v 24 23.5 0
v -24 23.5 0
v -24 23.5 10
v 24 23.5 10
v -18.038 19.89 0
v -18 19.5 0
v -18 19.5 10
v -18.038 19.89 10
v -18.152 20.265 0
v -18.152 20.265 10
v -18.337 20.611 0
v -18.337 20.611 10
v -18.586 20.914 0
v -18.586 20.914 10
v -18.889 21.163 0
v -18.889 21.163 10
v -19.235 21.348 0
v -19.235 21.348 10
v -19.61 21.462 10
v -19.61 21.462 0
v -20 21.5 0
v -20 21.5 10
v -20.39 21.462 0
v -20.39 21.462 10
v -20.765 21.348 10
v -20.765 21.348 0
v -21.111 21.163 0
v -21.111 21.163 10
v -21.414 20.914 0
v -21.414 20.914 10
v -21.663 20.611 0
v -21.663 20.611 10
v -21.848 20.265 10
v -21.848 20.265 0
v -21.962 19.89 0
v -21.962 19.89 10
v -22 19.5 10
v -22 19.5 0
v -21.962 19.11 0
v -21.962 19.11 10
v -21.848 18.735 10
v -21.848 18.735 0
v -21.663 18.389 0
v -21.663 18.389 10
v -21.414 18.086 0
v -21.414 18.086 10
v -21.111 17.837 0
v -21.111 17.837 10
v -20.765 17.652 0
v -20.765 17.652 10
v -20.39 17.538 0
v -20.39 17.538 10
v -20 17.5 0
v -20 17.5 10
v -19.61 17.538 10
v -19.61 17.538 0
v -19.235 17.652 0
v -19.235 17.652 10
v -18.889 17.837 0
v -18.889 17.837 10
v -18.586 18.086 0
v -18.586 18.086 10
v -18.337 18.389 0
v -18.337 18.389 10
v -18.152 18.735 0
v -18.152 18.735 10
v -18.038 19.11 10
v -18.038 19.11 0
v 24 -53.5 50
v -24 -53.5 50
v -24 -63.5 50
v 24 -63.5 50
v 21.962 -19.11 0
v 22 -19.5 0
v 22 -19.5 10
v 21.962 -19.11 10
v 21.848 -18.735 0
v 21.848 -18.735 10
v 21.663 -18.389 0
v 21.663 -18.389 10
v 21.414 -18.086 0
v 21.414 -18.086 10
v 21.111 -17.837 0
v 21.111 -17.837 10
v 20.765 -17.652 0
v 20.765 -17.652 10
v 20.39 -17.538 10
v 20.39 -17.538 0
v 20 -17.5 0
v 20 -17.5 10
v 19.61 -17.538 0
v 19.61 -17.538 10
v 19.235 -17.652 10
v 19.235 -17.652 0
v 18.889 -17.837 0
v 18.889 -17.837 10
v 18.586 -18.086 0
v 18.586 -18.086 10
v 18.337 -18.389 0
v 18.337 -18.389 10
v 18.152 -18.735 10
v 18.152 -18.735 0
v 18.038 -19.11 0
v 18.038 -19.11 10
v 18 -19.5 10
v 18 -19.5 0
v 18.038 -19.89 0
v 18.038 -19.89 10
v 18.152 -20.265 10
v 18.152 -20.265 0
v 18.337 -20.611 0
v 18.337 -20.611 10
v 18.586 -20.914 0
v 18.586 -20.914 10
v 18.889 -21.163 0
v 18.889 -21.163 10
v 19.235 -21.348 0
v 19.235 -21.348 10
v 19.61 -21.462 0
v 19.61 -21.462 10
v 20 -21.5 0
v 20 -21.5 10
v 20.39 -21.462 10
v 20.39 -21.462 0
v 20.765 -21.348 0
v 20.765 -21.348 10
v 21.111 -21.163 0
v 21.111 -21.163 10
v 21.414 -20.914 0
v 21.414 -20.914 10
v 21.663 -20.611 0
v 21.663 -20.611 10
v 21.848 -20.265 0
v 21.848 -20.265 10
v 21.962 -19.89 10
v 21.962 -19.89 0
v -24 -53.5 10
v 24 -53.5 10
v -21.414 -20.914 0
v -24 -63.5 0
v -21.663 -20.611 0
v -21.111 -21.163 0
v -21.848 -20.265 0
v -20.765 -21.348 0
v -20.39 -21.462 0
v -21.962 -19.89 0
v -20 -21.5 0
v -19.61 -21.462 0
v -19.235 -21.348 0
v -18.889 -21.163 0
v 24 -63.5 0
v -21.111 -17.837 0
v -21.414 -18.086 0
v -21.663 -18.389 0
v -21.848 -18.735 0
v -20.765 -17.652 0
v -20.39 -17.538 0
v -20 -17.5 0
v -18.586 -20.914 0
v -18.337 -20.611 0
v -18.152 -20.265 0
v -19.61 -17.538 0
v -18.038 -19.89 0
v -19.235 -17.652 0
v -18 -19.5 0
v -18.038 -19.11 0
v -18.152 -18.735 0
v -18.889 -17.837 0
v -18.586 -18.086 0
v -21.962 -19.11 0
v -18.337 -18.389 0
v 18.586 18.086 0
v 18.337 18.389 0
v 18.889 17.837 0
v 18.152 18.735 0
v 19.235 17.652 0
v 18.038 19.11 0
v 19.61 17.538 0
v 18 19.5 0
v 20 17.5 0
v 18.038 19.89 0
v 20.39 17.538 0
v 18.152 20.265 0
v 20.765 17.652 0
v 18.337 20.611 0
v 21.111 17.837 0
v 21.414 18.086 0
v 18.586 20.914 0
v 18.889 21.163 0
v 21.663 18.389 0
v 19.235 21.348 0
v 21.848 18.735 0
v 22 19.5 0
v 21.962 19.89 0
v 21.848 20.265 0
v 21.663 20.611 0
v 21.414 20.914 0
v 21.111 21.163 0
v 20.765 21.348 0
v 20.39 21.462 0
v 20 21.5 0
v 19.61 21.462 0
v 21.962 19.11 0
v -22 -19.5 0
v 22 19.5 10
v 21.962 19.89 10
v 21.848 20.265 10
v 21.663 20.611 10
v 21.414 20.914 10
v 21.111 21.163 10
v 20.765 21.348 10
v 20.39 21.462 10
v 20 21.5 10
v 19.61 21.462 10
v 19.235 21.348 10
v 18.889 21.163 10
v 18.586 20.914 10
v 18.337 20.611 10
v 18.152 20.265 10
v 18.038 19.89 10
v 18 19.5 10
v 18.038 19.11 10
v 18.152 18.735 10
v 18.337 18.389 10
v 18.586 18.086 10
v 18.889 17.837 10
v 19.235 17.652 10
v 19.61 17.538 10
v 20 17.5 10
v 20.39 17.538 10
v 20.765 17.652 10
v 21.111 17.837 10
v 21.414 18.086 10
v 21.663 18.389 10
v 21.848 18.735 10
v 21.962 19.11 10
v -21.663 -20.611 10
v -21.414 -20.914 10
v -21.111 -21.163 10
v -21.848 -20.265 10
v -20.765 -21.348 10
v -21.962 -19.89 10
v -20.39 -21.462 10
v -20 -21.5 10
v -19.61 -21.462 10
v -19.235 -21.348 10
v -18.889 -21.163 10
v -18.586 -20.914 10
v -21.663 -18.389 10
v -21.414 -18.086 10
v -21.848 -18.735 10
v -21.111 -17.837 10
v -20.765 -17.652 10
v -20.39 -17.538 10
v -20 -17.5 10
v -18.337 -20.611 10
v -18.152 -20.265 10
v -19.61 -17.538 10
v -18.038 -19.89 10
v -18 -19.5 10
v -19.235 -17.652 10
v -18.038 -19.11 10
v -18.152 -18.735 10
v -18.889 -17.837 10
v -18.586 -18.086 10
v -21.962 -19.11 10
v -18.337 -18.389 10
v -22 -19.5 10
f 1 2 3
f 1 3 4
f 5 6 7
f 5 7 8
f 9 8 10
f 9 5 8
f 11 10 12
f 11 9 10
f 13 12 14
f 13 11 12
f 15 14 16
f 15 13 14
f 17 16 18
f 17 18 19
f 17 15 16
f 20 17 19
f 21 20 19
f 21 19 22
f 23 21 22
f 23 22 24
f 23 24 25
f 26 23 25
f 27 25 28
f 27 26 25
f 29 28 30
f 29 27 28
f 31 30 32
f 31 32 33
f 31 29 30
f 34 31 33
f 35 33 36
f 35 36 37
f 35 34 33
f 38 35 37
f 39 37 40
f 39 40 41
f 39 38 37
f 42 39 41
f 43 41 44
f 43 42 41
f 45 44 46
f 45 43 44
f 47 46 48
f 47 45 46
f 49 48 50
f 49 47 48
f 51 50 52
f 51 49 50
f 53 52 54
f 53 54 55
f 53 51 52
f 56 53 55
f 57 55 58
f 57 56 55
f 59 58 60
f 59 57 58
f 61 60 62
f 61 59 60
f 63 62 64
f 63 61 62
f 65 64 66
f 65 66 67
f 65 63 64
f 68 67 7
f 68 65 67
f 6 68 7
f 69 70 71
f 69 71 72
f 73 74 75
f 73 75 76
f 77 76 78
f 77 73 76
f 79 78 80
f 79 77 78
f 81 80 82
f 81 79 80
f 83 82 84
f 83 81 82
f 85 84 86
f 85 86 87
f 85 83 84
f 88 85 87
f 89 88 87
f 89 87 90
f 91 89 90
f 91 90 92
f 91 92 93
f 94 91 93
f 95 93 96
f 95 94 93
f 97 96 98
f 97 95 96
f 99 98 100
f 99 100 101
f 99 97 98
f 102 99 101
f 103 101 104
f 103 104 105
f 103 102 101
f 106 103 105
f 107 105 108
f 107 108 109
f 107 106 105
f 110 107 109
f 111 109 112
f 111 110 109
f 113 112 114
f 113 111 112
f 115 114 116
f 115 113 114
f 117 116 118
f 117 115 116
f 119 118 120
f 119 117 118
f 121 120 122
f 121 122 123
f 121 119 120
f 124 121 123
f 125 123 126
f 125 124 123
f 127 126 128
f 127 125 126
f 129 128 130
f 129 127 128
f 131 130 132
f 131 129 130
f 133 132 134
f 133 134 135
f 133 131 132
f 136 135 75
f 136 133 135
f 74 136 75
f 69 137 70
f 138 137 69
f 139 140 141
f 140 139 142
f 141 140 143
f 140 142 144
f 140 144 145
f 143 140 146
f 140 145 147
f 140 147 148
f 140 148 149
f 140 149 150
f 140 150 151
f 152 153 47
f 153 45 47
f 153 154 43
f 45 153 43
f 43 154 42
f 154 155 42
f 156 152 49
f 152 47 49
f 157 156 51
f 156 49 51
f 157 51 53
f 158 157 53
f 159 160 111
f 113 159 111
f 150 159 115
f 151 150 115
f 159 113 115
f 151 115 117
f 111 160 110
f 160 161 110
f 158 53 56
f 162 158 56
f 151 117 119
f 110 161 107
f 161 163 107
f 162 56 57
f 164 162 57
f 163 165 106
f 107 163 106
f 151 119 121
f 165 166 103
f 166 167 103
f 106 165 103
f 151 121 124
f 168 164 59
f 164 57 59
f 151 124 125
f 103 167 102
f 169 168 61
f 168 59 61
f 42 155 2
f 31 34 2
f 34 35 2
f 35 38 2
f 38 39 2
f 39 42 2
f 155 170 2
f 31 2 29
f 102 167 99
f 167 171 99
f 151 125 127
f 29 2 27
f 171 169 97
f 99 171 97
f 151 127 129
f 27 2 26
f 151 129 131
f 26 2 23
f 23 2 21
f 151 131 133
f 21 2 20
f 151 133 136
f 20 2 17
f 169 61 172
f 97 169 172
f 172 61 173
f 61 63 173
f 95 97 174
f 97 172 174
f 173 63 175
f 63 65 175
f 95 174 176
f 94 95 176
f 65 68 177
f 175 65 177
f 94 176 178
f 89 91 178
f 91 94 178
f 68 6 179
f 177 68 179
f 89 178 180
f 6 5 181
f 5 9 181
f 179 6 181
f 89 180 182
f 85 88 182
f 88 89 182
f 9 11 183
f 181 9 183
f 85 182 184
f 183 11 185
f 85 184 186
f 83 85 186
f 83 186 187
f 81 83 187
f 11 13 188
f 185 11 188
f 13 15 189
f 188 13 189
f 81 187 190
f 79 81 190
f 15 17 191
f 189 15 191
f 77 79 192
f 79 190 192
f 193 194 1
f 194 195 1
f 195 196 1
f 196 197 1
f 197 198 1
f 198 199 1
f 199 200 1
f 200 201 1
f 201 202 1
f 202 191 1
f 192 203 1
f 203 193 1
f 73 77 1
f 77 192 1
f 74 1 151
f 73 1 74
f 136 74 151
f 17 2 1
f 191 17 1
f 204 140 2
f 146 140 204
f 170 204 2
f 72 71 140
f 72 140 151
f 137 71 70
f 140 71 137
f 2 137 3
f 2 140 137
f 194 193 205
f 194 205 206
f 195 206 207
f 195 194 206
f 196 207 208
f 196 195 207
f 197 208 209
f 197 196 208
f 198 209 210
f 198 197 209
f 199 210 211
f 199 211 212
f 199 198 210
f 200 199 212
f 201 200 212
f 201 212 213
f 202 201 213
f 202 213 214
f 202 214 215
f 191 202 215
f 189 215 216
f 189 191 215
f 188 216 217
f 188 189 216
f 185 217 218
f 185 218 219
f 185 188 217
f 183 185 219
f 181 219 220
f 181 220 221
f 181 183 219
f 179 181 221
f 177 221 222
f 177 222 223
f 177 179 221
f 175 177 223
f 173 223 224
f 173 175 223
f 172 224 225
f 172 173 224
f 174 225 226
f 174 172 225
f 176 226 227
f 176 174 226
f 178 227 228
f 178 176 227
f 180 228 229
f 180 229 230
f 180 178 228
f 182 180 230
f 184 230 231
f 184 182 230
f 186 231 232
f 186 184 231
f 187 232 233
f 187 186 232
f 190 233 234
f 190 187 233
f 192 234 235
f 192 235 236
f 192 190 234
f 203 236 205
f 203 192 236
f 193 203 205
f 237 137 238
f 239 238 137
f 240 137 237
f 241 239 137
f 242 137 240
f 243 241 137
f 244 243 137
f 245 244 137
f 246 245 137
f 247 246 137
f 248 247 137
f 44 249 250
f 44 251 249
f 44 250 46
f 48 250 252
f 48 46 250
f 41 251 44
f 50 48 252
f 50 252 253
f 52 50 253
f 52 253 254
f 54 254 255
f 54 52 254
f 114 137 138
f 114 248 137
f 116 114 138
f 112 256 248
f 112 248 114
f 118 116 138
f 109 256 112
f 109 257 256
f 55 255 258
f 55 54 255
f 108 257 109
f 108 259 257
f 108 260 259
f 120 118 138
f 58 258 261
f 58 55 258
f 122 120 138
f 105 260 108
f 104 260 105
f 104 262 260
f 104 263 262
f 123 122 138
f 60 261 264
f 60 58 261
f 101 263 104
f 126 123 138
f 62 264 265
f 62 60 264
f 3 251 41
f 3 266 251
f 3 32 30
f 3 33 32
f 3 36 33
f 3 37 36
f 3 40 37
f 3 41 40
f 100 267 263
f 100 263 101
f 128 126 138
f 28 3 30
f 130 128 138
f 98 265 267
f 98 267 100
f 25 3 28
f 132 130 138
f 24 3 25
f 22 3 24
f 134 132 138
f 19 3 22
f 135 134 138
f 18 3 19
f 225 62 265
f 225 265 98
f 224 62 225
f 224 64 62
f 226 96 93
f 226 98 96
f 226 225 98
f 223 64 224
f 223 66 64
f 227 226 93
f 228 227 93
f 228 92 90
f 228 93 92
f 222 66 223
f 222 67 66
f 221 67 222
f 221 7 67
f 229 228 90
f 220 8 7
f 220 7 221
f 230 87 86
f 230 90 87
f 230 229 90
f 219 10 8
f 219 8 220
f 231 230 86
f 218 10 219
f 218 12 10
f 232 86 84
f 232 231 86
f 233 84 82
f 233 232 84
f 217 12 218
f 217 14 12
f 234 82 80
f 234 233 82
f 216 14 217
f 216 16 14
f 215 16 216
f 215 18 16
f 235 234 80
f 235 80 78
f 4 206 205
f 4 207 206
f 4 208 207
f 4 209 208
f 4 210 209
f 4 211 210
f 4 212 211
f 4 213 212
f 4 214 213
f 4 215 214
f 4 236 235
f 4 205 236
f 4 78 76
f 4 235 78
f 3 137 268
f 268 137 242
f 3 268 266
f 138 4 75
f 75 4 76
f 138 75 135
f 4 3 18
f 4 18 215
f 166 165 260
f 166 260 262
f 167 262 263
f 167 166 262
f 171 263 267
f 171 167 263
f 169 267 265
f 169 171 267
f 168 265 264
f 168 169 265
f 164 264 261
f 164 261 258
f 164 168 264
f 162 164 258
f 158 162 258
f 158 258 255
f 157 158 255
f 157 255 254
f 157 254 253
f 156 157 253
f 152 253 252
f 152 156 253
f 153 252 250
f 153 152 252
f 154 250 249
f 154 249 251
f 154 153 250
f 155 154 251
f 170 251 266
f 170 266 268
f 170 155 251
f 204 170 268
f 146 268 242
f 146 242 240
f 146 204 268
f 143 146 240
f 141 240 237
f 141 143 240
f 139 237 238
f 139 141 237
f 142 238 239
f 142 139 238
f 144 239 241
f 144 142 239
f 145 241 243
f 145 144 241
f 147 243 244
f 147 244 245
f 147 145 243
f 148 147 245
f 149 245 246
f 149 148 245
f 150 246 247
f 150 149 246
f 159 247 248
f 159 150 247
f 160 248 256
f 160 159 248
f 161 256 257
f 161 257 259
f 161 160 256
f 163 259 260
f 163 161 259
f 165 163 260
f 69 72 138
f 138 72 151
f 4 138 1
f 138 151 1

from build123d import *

# Parameters (mm, degrees)
SKETCH3_W           = 48
SKETCH3_H           = 87
SKETCH3_R           = 2
BOSS_EXTRUDE1_DEPTH = 10
SKETCH3_3_W         = 48
SKETCH3_3_H         = 10
BOSS_EXTRUDE2_DEPTH = 50


with BuildPart() as part:
    # Sketch3 → Boss-Extrude1 (new body)
    with BuildSketch(Plane.XY):
        with Locations((0, -20)):
            Rectangle(SKETCH3_W, SKETCH3_H)
        with Locations((20, 19.5)):
            Circle(SKETCH3_R, mode=Mode.SUBTRACT)
        with Locations((-20, -19.5)):
            Circle(SKETCH3_R, mode=Mode.SUBTRACT)
        with Locations((-20, 19.5)):
            Circle(SKETCH3_R, mode=Mode.SUBTRACT)
        with Locations((20, -19.5)):
            Circle(SKETCH3_R, mode=Mode.SUBTRACT)
    extrude(amount=BOSS_EXTRUDE1_DEPTH)

    # Sketch3<3> → Boss-Extrude2 (add)
    with BuildSketch(Plane.XY):
        with Locations((0, -58.5)):
            Rectangle(SKETCH3_3_W, SKETCH3_3_H)
    extrude(amount=BOSS_EXTRUDE2_DEPTH)


solid = part.part
